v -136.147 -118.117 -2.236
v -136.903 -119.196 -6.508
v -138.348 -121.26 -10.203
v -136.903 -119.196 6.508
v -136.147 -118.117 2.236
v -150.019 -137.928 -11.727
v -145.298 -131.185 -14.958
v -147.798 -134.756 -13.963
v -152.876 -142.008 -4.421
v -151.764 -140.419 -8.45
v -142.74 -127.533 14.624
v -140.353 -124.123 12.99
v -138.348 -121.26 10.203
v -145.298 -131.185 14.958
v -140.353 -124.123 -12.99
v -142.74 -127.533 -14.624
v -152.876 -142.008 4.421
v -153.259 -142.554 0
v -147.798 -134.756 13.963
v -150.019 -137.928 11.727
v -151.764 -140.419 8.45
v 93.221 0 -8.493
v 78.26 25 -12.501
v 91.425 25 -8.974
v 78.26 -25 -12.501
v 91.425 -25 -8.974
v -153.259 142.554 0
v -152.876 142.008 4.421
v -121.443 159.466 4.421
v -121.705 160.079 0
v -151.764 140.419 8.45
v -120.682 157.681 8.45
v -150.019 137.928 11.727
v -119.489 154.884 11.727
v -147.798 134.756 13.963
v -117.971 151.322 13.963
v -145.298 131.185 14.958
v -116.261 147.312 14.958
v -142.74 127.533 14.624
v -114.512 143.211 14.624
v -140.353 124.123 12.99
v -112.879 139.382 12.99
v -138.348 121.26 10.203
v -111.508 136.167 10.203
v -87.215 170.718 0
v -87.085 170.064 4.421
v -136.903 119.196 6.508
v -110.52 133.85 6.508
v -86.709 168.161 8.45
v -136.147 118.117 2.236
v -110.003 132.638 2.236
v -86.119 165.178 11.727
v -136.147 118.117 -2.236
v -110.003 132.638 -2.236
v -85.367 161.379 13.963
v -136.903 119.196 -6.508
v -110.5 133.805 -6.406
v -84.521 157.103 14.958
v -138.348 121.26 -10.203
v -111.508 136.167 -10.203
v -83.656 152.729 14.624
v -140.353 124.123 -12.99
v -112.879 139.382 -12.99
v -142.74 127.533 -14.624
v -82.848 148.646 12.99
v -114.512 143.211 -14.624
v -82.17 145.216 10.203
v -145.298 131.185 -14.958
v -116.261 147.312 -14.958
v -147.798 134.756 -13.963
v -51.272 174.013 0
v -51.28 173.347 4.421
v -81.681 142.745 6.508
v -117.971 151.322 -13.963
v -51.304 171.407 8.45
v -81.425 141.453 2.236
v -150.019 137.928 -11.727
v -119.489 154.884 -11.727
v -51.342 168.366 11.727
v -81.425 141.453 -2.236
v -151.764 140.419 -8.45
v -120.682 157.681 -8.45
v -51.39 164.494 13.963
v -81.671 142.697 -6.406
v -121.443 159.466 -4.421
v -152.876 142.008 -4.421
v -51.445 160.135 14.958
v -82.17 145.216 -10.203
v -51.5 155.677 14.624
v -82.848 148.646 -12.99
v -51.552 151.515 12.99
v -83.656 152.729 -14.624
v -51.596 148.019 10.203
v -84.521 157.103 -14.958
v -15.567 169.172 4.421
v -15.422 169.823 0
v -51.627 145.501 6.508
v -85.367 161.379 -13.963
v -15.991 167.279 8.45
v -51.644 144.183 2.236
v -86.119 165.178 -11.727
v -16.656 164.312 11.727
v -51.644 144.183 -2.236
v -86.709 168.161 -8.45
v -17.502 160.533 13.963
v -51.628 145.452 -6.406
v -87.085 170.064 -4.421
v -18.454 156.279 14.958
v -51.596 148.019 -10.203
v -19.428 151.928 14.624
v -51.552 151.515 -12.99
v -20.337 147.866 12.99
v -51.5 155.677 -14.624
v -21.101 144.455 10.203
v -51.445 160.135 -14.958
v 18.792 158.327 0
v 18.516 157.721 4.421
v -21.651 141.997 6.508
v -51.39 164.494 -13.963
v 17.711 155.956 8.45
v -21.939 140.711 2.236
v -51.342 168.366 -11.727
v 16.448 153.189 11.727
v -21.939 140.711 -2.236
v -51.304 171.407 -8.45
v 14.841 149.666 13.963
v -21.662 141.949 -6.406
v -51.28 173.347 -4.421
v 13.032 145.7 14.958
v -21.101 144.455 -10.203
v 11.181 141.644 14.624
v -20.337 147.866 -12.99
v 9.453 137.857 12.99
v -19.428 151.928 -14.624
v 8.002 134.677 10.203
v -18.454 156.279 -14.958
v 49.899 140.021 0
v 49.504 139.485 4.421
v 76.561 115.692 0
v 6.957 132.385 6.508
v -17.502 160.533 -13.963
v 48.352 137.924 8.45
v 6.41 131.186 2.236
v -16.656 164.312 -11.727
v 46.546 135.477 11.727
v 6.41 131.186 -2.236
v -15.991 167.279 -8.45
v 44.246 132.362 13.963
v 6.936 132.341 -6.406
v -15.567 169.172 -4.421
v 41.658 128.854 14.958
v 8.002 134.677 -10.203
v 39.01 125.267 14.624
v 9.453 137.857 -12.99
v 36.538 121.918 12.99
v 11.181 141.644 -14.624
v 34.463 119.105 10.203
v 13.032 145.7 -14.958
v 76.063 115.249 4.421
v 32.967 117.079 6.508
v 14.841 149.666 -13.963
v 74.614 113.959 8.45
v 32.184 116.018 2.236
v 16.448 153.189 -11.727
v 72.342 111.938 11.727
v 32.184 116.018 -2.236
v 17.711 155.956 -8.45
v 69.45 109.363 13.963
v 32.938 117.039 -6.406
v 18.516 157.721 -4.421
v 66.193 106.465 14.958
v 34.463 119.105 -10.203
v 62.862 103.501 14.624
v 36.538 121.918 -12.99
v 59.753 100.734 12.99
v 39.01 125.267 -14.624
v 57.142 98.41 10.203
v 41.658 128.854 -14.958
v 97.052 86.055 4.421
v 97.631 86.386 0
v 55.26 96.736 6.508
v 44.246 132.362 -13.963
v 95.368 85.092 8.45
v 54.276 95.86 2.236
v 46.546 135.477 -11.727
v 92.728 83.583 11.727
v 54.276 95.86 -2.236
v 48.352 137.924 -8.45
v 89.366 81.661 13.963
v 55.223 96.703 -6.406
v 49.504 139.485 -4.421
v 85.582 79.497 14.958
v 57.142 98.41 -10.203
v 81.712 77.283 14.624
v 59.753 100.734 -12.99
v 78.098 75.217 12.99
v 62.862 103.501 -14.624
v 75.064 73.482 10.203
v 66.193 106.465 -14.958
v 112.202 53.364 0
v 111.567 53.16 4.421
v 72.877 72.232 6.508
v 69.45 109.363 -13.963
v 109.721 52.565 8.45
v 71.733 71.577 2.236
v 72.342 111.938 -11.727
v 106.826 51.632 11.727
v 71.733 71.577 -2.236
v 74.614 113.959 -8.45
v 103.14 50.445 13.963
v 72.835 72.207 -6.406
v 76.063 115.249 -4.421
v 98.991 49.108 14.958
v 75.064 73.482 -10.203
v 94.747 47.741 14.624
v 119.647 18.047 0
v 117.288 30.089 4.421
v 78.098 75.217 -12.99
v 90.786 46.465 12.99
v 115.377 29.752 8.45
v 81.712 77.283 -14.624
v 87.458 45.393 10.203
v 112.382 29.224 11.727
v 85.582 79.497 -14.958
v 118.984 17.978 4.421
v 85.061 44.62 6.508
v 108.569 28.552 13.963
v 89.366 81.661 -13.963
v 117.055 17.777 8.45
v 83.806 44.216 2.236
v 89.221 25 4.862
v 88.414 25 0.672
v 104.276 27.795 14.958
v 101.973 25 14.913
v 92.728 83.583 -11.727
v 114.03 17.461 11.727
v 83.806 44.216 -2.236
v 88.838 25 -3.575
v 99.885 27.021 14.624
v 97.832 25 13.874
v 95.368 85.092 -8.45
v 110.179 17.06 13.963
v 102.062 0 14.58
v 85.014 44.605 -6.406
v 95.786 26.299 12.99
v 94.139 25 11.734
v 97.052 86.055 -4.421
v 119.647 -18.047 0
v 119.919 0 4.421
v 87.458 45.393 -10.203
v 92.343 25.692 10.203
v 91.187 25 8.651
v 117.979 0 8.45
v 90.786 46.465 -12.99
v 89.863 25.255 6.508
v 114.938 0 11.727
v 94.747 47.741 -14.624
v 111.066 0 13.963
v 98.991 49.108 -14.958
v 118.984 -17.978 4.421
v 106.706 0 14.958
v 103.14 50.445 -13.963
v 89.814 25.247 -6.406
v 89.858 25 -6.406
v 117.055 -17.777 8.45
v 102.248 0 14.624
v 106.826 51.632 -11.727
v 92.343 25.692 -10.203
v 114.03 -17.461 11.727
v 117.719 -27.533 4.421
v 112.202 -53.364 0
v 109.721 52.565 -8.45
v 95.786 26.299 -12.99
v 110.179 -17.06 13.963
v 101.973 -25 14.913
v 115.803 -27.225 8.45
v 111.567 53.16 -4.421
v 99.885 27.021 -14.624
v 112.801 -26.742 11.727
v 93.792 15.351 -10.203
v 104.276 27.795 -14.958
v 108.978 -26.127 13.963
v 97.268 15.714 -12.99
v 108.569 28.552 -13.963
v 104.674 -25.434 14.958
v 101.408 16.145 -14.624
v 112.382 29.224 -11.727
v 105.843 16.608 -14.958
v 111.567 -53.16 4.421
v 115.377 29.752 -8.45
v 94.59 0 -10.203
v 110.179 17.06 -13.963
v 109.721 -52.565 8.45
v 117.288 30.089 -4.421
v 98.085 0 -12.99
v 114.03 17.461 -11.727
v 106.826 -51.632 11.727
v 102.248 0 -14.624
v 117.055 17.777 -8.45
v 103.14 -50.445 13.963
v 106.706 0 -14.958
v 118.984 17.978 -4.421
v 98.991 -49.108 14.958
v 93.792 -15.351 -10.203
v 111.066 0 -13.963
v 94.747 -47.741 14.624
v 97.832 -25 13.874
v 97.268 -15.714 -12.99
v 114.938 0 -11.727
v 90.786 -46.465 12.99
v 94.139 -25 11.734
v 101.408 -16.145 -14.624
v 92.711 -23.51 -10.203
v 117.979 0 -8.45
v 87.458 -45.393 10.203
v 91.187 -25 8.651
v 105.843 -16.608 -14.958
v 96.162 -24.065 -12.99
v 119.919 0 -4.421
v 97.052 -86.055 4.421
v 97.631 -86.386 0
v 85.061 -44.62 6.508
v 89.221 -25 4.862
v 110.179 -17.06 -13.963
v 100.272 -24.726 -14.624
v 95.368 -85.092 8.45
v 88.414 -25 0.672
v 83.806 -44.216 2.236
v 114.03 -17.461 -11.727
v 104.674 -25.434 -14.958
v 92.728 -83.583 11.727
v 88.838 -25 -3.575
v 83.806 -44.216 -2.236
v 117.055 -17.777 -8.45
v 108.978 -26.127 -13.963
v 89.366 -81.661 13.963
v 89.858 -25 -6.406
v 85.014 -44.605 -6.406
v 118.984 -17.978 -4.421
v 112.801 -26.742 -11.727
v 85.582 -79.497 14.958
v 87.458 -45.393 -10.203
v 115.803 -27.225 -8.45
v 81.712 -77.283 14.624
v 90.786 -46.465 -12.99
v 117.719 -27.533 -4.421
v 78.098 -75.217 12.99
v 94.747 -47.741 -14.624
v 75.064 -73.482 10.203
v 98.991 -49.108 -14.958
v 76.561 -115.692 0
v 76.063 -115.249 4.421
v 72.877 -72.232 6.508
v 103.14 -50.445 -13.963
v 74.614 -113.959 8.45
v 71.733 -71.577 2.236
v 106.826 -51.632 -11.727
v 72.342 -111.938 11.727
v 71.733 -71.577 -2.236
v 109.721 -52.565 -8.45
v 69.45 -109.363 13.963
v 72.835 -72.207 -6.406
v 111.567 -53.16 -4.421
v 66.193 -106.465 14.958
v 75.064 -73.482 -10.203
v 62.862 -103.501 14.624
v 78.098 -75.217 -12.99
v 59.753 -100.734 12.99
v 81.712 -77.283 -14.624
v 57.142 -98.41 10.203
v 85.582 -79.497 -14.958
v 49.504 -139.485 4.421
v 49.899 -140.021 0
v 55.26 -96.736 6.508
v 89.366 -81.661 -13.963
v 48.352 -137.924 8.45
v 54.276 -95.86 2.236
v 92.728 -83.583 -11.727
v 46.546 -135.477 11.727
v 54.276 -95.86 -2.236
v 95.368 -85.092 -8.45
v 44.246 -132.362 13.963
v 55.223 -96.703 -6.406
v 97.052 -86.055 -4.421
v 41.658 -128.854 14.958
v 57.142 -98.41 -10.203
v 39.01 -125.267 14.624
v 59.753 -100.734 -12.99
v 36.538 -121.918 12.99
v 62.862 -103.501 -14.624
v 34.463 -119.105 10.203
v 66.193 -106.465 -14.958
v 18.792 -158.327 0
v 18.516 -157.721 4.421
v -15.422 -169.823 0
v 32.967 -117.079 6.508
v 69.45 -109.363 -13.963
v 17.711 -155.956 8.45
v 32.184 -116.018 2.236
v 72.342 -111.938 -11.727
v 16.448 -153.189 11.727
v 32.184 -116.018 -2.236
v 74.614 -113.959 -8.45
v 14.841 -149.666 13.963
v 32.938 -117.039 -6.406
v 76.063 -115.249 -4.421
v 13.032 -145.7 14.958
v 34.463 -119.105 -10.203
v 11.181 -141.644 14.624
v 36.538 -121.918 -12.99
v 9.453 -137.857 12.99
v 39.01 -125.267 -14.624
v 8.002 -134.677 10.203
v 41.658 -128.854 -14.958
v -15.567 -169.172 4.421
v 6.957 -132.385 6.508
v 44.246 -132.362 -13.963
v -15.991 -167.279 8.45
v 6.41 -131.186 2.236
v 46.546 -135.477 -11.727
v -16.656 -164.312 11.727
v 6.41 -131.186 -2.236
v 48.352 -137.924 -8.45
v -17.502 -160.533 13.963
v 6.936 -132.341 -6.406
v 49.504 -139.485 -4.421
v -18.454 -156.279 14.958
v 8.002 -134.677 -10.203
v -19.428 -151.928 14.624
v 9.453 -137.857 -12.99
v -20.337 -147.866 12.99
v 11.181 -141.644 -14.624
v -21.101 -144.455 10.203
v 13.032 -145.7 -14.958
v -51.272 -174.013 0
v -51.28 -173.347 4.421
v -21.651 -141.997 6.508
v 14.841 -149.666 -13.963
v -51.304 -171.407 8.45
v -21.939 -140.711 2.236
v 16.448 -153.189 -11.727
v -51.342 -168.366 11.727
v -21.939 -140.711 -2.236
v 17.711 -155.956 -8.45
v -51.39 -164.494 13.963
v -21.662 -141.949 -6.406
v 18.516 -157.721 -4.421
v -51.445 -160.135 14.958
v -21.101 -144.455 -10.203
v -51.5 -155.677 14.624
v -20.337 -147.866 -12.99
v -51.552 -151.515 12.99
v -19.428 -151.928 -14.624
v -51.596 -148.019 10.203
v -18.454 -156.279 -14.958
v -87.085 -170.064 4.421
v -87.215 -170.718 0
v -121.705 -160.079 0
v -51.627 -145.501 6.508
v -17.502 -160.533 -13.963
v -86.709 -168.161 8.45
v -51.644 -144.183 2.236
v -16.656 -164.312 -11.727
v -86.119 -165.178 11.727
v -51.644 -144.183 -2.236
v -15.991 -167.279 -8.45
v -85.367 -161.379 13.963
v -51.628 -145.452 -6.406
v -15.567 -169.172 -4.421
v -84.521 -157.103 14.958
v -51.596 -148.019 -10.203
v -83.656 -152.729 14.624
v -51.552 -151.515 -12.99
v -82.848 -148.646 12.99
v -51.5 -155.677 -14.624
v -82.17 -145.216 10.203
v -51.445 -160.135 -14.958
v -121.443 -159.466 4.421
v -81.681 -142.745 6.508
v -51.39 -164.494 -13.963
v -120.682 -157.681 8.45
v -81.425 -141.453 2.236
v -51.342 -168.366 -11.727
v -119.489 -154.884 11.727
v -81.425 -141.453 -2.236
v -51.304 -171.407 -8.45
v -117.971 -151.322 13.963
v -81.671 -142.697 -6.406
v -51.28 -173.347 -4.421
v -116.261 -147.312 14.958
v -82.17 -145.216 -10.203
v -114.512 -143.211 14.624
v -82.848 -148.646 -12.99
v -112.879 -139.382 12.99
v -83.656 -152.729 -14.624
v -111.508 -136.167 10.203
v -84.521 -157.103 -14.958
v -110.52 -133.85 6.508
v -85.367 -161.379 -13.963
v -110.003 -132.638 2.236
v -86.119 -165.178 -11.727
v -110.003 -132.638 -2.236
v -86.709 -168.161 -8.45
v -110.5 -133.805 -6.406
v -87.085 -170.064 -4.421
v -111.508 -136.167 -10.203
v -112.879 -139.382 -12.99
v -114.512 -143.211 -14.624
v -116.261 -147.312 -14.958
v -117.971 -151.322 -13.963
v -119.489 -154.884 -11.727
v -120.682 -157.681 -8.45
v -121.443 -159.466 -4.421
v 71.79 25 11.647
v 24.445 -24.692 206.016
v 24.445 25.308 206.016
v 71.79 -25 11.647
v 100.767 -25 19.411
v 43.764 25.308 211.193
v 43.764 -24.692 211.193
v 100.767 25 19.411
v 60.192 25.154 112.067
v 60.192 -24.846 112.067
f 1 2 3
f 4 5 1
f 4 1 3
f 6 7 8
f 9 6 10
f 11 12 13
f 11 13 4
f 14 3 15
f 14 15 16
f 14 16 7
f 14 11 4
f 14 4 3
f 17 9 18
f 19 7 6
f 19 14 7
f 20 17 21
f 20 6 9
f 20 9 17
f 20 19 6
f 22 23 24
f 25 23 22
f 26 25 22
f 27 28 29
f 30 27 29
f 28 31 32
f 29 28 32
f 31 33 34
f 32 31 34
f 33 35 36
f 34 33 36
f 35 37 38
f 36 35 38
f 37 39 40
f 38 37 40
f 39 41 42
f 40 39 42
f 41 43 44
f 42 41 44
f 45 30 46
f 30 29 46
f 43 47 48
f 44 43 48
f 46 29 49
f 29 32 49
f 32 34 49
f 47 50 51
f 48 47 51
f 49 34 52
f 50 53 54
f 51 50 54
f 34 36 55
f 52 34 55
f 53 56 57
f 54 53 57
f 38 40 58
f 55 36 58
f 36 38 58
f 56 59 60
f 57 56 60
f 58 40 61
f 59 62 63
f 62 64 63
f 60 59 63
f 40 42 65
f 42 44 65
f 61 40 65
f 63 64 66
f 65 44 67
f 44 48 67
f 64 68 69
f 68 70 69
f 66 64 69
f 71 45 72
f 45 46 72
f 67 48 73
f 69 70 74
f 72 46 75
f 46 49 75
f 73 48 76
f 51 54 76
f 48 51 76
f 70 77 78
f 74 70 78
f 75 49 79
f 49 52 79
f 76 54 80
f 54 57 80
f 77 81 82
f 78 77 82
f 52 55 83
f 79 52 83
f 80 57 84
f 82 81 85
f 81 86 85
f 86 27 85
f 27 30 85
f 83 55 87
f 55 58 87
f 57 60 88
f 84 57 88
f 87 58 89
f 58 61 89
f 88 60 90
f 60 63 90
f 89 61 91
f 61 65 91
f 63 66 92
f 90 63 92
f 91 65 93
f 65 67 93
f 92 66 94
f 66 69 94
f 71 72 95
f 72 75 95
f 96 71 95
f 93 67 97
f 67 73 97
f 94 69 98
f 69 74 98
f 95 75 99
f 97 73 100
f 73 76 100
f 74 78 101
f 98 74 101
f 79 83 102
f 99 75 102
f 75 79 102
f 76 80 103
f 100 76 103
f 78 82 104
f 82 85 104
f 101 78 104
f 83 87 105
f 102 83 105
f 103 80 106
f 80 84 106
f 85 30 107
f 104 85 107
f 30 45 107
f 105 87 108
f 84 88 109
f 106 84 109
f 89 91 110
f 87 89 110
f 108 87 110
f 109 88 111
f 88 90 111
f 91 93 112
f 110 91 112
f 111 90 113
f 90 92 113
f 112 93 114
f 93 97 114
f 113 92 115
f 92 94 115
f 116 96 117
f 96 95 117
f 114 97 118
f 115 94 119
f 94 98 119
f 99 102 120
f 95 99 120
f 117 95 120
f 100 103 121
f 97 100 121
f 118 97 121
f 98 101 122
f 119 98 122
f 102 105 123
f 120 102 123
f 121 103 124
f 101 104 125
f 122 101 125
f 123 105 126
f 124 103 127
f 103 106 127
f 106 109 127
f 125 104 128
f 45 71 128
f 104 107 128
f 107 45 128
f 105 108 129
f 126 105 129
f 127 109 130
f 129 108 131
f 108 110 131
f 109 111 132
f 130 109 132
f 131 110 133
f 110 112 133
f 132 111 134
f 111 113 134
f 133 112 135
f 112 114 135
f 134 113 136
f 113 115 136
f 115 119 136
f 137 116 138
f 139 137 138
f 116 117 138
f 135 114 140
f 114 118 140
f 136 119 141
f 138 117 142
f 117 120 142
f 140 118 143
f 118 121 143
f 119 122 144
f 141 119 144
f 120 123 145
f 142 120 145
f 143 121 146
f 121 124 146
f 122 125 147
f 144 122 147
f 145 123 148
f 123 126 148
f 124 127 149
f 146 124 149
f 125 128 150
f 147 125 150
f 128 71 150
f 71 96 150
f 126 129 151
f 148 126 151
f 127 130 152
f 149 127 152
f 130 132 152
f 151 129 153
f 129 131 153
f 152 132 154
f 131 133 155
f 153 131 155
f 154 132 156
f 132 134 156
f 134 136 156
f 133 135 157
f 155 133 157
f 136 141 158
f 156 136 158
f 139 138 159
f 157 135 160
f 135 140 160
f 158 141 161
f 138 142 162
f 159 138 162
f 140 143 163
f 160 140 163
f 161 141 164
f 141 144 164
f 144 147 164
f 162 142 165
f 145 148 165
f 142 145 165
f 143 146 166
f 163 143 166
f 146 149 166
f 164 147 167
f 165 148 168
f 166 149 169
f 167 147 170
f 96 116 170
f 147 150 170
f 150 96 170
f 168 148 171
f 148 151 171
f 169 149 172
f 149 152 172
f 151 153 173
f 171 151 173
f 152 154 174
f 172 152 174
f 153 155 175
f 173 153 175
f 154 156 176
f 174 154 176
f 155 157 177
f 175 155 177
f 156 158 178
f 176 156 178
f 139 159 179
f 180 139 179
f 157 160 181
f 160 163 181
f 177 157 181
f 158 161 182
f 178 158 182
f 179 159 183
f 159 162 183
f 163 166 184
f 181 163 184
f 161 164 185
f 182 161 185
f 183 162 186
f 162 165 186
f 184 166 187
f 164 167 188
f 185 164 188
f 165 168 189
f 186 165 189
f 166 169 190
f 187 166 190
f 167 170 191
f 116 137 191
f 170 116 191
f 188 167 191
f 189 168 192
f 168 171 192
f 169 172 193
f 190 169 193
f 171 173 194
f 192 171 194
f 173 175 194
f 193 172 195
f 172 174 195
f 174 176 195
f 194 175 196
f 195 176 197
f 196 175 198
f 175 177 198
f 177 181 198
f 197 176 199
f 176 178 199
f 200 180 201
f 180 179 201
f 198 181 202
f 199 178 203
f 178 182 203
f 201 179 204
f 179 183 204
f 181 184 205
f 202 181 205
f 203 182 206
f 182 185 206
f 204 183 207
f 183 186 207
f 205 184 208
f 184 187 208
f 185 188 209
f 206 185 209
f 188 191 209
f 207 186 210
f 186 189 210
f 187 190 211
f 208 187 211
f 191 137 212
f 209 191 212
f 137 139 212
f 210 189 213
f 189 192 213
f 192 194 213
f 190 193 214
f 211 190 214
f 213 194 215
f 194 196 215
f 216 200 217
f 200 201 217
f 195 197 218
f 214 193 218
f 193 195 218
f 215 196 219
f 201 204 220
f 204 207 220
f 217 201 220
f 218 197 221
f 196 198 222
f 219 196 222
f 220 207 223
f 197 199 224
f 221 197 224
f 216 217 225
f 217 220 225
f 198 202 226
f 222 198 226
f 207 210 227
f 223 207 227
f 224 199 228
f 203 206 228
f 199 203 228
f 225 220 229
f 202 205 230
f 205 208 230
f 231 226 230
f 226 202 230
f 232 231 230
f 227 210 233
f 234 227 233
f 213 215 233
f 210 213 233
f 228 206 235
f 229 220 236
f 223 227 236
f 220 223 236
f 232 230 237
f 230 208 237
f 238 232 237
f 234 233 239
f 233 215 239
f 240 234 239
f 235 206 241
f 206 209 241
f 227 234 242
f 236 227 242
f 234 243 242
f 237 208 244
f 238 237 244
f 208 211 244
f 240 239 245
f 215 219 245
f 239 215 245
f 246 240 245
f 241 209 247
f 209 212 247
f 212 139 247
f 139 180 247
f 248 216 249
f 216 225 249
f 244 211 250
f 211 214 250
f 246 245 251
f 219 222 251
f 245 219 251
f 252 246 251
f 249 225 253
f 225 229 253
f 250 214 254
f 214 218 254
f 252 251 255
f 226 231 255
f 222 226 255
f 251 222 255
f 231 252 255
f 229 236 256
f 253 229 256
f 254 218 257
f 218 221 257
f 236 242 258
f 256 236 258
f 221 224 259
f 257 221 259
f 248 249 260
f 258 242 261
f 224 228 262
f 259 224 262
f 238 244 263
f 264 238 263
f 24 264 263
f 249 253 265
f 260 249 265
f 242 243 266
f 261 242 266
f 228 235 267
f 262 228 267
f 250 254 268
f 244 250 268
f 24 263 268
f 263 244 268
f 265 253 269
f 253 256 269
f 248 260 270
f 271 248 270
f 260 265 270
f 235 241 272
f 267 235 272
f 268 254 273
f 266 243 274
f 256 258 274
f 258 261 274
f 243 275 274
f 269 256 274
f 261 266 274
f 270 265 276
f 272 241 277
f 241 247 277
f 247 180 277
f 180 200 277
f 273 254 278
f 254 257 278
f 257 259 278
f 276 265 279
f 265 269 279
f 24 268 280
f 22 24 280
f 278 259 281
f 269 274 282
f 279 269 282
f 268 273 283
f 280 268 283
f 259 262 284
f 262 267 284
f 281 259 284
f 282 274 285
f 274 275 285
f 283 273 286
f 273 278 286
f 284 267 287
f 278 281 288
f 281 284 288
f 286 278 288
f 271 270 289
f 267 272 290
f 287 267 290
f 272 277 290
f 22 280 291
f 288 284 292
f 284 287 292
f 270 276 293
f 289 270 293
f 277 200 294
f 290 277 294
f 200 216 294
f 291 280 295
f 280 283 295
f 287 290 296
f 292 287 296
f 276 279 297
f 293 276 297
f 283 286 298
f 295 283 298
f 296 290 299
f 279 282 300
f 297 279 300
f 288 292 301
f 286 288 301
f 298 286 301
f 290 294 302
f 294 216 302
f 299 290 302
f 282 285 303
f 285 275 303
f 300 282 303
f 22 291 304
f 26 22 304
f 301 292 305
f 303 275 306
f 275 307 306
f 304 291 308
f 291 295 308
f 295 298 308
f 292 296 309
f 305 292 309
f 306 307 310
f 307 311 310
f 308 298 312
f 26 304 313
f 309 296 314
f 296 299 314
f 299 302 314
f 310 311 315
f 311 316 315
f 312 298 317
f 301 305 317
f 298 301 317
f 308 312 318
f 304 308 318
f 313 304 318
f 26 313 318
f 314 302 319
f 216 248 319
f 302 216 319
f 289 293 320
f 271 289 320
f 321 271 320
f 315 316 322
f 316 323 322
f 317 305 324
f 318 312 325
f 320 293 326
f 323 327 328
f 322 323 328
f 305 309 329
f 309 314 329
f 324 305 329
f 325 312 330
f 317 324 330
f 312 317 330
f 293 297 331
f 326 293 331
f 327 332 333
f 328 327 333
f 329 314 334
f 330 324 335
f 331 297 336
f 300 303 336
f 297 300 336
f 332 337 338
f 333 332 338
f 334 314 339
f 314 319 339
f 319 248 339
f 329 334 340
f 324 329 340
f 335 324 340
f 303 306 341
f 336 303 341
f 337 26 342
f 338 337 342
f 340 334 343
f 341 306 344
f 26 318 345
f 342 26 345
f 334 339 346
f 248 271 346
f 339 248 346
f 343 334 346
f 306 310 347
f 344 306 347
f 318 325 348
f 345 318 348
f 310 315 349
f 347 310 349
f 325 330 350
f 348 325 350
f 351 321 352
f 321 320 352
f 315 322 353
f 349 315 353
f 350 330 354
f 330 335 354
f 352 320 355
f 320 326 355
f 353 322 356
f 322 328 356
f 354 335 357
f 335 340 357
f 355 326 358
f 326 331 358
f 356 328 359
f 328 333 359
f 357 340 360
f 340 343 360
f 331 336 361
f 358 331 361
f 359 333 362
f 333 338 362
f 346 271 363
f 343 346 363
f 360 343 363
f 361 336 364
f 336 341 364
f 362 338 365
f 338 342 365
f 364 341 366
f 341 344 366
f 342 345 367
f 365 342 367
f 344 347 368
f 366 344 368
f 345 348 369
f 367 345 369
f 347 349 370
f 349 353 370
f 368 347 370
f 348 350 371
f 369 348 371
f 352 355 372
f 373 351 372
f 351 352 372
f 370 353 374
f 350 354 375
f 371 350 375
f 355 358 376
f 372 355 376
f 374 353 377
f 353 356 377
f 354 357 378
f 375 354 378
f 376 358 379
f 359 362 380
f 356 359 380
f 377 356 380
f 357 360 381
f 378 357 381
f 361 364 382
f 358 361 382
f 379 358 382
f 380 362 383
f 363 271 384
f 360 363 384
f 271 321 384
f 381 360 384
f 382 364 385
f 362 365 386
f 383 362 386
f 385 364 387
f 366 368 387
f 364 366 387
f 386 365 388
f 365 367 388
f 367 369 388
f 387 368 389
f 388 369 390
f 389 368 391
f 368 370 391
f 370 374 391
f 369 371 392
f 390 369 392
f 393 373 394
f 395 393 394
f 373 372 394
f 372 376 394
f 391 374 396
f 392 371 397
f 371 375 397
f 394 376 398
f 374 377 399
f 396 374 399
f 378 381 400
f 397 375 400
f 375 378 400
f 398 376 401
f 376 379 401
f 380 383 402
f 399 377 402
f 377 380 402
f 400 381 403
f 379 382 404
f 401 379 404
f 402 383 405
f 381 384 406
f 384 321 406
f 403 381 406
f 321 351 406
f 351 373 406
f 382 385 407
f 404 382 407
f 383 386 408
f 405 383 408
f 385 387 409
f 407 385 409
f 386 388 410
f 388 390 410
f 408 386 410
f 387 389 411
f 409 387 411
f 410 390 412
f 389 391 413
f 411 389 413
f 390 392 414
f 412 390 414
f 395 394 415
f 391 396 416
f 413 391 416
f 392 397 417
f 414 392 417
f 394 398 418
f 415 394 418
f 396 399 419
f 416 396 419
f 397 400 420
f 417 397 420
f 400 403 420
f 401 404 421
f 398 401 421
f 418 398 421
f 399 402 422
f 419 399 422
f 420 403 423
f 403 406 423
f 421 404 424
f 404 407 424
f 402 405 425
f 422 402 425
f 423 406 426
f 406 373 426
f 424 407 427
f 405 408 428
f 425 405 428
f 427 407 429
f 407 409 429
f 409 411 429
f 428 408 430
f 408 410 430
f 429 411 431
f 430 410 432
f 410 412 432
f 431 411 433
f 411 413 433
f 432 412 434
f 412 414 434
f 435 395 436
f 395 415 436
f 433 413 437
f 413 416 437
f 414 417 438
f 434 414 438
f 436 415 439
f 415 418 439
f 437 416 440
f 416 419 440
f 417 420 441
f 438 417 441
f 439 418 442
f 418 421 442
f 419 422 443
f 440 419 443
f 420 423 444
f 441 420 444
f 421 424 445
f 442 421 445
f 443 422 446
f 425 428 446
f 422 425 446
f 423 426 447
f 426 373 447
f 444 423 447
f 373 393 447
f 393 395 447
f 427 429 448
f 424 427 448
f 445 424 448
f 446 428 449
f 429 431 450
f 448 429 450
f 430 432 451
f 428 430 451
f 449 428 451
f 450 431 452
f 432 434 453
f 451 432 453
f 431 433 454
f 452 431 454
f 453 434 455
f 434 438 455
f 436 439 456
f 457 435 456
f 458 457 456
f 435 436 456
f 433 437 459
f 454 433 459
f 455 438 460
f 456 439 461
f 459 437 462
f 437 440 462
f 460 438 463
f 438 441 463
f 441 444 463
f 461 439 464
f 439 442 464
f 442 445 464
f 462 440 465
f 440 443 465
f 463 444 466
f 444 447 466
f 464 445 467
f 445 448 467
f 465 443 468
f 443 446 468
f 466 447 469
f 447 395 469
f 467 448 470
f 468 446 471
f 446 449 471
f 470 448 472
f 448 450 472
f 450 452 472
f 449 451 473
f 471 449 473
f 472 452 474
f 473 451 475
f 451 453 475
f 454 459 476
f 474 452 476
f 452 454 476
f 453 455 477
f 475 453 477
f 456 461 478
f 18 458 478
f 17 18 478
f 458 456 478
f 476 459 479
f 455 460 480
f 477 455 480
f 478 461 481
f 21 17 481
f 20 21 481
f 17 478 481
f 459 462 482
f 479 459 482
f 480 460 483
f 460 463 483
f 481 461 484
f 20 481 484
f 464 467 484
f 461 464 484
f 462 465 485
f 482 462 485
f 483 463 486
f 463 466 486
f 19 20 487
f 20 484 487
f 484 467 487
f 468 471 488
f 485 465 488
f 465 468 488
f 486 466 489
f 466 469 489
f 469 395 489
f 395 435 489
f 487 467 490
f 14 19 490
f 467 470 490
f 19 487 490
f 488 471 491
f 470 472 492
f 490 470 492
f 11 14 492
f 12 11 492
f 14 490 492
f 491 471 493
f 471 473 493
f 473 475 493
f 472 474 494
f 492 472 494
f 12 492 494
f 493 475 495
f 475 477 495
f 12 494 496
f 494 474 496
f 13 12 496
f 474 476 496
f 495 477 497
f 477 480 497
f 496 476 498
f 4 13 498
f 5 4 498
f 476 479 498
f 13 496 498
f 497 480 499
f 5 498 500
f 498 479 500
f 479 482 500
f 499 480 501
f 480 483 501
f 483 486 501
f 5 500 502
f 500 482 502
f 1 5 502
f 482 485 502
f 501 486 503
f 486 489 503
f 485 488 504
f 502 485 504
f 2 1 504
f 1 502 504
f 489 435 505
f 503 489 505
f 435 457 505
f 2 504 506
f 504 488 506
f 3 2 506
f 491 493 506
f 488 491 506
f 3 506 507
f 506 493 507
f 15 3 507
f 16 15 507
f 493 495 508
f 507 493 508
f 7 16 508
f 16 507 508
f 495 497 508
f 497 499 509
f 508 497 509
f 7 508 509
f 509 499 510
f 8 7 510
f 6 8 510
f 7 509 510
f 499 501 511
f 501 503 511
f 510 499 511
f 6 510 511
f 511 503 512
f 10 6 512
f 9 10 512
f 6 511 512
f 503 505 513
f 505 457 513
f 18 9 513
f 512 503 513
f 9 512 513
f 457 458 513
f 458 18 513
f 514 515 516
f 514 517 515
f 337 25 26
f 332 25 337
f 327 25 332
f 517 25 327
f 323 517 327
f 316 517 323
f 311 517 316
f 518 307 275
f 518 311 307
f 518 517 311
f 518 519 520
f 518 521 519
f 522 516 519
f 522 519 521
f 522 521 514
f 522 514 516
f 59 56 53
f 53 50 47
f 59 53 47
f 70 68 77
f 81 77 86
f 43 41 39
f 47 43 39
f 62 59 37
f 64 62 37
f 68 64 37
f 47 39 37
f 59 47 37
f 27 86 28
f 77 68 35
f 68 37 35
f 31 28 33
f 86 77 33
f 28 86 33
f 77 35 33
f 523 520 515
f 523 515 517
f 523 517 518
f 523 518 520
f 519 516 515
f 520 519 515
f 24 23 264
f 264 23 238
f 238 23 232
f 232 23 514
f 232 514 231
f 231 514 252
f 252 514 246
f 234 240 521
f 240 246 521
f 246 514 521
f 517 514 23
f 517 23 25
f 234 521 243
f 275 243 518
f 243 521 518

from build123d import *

# Parameters (mm, degrees)
F0_R          = 15
F2_ANGLE_BACK = 125
F2_ANGLE      = 250
F6_W          = 30
F6_H          = 50
F7_DEPTH      = 25
F9_W          = 20
F9_H          = 50
F7_FACE_W     = 30
F7_FACE_H     = 50


with BuildPart() as f2:
    # F0 (on Front) → F2 (revolve)
    with BuildSketch(Plane.XZ, mode=Mode.PRIVATE) as f2_sk:
        with Locations((105.5854605263, 0)):
            Circle(F0_R)
    revolve(f2_sk.sketch.rotate(Axis((-53.4410737455, 0, -2.1003899164), (0, 0, -1)), -F2_ANGLE_BACK), axis=Axis((-53.4410737455, 0, -2.1003899164), (0, 0, -1)), revolution_arc=F2_ANGLE)

    # F6 (on line) → F7 (join)
    with BuildSketch(Plane(origin=(1.8972807651, 0, -7.0807482116), x_dir=(0.9659258263, 0, 0.2588190451), z_dir=(0.2588190451, 0, -0.9659258263))):
        with Locations((87.3579102681, 0)):
            Rectangle(F6_W, F6_H)
    extrude(amount=F7_DEPTH)

    # F9 (on offset) → F10 section 0
    with BuildSketch(Plane(origin=(-49.8665282554, 0, 186.1044170462), x_dir=(0.9659258263, 0, 0.2588190451), z_dir=(0.2588190451, 0, -0.9659258263))):
        with Locations((86.933324366, -0.3083702177)):
            Rectangle(F9_W, F9_H)
    # F7_face (on face) → F10 section 1
    with BuildSketch(Plane(origin=(86.2785424237, 0, 15.5291427062), x_dir=(0.9659258263, 0, 0.2588190451), z_dir=(-0.2588190451, 0, 0.9659258263))):
        Rectangle(F7_FACE_W, F7_FACE_H)
    loft()


solid = f2.part
